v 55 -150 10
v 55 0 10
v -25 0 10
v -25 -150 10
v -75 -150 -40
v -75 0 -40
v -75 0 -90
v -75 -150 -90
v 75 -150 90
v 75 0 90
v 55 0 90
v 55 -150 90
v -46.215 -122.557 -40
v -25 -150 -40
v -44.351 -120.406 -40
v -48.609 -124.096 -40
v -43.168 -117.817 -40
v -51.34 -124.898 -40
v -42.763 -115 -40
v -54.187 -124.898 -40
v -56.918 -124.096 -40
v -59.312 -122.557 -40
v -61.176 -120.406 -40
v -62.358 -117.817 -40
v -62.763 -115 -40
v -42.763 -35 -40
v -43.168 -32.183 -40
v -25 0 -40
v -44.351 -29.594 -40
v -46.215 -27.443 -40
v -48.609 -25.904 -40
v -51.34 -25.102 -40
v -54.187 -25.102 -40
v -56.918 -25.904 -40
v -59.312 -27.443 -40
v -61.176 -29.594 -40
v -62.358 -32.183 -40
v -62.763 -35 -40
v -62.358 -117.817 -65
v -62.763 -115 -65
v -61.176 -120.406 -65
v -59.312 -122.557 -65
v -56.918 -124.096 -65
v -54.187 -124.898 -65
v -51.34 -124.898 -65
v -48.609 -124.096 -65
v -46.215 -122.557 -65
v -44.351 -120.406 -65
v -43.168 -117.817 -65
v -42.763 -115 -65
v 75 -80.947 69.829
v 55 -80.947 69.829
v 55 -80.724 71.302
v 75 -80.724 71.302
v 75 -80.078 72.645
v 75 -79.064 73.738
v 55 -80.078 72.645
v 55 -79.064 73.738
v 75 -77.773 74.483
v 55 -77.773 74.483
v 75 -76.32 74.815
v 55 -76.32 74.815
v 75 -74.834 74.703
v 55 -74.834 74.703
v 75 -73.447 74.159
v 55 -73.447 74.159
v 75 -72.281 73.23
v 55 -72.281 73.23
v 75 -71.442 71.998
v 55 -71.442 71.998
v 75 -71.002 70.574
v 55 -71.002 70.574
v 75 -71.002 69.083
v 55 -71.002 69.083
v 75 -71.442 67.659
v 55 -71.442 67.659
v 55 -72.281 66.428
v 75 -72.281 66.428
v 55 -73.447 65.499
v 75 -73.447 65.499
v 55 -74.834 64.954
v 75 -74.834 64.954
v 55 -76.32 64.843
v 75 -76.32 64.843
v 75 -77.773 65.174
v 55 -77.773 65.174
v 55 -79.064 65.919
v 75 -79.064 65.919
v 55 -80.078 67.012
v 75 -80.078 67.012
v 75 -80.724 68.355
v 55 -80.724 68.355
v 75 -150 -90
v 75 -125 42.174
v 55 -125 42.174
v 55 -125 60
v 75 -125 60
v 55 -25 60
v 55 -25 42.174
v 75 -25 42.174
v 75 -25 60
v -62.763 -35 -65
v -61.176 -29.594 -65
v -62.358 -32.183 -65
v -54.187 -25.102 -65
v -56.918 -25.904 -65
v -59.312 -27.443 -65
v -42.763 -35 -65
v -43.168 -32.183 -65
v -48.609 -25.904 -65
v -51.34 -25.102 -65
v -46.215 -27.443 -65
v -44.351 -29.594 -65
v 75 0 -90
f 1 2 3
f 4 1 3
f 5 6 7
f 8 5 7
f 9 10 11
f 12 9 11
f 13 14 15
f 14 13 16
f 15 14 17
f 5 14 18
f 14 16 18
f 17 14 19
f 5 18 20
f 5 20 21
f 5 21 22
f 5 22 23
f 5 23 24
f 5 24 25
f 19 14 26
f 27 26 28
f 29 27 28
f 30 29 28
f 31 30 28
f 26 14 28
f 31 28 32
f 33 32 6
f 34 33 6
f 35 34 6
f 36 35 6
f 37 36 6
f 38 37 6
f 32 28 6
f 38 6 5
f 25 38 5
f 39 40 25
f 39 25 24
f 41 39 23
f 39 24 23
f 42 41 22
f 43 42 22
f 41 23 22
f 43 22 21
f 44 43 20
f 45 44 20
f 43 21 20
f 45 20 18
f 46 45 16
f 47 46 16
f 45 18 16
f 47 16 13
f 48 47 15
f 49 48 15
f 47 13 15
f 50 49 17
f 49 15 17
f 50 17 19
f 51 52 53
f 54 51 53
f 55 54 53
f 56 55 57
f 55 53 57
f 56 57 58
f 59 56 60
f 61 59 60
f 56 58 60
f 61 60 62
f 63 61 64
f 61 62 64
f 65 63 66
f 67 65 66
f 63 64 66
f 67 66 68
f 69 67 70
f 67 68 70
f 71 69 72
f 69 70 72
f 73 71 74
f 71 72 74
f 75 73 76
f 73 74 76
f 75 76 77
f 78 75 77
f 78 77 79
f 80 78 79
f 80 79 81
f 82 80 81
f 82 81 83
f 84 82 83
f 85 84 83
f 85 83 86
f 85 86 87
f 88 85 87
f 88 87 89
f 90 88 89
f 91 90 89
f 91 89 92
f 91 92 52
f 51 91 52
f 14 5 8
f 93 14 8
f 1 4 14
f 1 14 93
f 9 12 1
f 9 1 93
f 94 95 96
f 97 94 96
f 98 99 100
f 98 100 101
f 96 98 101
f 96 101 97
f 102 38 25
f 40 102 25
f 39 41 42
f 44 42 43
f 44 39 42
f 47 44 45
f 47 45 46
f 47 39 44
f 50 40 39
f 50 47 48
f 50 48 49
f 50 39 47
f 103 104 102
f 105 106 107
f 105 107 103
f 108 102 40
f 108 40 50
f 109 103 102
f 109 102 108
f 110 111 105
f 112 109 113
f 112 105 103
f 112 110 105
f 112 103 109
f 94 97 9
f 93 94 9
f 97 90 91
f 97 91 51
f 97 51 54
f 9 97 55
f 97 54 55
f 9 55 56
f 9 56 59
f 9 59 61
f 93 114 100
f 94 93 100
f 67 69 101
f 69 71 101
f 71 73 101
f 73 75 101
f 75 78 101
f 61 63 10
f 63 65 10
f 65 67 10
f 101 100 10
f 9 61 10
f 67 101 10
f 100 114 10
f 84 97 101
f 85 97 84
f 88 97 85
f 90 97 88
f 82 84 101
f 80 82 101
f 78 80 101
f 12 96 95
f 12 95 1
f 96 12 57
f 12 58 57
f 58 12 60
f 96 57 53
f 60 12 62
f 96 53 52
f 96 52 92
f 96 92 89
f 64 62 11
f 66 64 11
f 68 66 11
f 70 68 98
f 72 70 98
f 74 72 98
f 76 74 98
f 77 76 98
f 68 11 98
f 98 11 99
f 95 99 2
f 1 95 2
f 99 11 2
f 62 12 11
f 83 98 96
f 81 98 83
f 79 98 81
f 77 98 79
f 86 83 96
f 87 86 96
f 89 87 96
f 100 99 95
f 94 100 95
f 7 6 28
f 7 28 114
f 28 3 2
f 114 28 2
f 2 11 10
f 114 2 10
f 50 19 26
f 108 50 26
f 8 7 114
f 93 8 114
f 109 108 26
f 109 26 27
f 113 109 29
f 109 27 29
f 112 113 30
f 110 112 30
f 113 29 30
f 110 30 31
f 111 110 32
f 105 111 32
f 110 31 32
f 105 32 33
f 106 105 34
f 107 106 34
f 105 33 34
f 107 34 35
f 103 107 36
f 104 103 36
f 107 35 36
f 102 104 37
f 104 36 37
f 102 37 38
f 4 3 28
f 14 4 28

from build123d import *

# Parameters (mm, degrees)
F1_DEPTH = 150
F2_R     = 5
F3_DEPTH = 20.001
F4_W     = 100
F4_H     = 17.8262033769
F5_DEPTH = 20.001
F7_DEPTH = 25


with BuildPart() as f1:
    # F0 (on Front) → F1 (new body)
    with BuildSketch(Plane.XZ):
        Polygon((75, -90), (75, 90), (55, 90), (55, 10), (-25, 10), (-25, -40), (-75, -40), (-75, -90), align=None)
    extrude(amount=F1_DEPTH)

    # F2 (on face) → F3 (cut, through all)
    with BuildSketch(Plane(origin=(55, 0, 0), x_dir=(0, -1, 0), z_dir=(-1, 0, 0))):
        with Locations((75.9465023875, 69.8286518455)):
            Circle(F2_R)
    extrude(amount=-F3_DEPTH, mode=Mode.SUBTRACT)

    # F4 (on face) → F5 (cut, through all)
    with BuildSketch(Plane(origin=(55, 0, 0), x_dir=(0, -1, 0), z_dir=(-1, 0, 0))):
        with Locations((75, 51.0868983116)):
            Rectangle(F4_W, F4_H)
    extrude(amount=-F5_DEPTH, mode=Mode.SUBTRACT)

    # F6 (on face) → F7 (cut)
    with BuildSketch(Plane.XY.offset(-40)):
        with BuildLine():
            ThreePointArc((-42.7634136379, -115), (-52.7634136379, -105), (-62.7634136379, -115))
            Line((-62.7634136379, -115), (-42.7634136379, -115))
        make_face()
        with BuildLine():
            Line((-62.7634136379, -35), (-62.7634136379, -115))
            ThreePointArc((-62.7634136379, -115), (-52.7634136379, -105), (-42.7634136379, -115))
            Line((-42.7634136379, -115), (-42.7634136379, -35))
            ThreePointArc((-42.7634136379, -35), (-52.7634136379, -45), (-62.7634136379, -35))
        make_face()
        with BuildLine():
            Line((-42.7634136379, -115), (-62.7634136379, -115))
            ThreePointArc((-62.7634136379, -115), (-52.7634136379, -125), (-42.7634136379, -115))
        make_face()
        with BuildLine():
            ThreePointArc((-42.7634136379, -35), (-52.7634136379, -25), (-62.7634136379, -35))
            Line((-62.7634136379, -35), (-42.7634136379, -35))
        make_face()
        with BuildLine():
            Line((-42.7634136379, -35), (-62.7634136379, -35))
            ThreePointArc((-62.7634136379, -35), (-52.7634136379, -45), (-42.7634136379, -35))
        make_face()
    extrude(amount=-F7_DEPTH, mode=Mode.SUBTRACT)


solid = f1.part
